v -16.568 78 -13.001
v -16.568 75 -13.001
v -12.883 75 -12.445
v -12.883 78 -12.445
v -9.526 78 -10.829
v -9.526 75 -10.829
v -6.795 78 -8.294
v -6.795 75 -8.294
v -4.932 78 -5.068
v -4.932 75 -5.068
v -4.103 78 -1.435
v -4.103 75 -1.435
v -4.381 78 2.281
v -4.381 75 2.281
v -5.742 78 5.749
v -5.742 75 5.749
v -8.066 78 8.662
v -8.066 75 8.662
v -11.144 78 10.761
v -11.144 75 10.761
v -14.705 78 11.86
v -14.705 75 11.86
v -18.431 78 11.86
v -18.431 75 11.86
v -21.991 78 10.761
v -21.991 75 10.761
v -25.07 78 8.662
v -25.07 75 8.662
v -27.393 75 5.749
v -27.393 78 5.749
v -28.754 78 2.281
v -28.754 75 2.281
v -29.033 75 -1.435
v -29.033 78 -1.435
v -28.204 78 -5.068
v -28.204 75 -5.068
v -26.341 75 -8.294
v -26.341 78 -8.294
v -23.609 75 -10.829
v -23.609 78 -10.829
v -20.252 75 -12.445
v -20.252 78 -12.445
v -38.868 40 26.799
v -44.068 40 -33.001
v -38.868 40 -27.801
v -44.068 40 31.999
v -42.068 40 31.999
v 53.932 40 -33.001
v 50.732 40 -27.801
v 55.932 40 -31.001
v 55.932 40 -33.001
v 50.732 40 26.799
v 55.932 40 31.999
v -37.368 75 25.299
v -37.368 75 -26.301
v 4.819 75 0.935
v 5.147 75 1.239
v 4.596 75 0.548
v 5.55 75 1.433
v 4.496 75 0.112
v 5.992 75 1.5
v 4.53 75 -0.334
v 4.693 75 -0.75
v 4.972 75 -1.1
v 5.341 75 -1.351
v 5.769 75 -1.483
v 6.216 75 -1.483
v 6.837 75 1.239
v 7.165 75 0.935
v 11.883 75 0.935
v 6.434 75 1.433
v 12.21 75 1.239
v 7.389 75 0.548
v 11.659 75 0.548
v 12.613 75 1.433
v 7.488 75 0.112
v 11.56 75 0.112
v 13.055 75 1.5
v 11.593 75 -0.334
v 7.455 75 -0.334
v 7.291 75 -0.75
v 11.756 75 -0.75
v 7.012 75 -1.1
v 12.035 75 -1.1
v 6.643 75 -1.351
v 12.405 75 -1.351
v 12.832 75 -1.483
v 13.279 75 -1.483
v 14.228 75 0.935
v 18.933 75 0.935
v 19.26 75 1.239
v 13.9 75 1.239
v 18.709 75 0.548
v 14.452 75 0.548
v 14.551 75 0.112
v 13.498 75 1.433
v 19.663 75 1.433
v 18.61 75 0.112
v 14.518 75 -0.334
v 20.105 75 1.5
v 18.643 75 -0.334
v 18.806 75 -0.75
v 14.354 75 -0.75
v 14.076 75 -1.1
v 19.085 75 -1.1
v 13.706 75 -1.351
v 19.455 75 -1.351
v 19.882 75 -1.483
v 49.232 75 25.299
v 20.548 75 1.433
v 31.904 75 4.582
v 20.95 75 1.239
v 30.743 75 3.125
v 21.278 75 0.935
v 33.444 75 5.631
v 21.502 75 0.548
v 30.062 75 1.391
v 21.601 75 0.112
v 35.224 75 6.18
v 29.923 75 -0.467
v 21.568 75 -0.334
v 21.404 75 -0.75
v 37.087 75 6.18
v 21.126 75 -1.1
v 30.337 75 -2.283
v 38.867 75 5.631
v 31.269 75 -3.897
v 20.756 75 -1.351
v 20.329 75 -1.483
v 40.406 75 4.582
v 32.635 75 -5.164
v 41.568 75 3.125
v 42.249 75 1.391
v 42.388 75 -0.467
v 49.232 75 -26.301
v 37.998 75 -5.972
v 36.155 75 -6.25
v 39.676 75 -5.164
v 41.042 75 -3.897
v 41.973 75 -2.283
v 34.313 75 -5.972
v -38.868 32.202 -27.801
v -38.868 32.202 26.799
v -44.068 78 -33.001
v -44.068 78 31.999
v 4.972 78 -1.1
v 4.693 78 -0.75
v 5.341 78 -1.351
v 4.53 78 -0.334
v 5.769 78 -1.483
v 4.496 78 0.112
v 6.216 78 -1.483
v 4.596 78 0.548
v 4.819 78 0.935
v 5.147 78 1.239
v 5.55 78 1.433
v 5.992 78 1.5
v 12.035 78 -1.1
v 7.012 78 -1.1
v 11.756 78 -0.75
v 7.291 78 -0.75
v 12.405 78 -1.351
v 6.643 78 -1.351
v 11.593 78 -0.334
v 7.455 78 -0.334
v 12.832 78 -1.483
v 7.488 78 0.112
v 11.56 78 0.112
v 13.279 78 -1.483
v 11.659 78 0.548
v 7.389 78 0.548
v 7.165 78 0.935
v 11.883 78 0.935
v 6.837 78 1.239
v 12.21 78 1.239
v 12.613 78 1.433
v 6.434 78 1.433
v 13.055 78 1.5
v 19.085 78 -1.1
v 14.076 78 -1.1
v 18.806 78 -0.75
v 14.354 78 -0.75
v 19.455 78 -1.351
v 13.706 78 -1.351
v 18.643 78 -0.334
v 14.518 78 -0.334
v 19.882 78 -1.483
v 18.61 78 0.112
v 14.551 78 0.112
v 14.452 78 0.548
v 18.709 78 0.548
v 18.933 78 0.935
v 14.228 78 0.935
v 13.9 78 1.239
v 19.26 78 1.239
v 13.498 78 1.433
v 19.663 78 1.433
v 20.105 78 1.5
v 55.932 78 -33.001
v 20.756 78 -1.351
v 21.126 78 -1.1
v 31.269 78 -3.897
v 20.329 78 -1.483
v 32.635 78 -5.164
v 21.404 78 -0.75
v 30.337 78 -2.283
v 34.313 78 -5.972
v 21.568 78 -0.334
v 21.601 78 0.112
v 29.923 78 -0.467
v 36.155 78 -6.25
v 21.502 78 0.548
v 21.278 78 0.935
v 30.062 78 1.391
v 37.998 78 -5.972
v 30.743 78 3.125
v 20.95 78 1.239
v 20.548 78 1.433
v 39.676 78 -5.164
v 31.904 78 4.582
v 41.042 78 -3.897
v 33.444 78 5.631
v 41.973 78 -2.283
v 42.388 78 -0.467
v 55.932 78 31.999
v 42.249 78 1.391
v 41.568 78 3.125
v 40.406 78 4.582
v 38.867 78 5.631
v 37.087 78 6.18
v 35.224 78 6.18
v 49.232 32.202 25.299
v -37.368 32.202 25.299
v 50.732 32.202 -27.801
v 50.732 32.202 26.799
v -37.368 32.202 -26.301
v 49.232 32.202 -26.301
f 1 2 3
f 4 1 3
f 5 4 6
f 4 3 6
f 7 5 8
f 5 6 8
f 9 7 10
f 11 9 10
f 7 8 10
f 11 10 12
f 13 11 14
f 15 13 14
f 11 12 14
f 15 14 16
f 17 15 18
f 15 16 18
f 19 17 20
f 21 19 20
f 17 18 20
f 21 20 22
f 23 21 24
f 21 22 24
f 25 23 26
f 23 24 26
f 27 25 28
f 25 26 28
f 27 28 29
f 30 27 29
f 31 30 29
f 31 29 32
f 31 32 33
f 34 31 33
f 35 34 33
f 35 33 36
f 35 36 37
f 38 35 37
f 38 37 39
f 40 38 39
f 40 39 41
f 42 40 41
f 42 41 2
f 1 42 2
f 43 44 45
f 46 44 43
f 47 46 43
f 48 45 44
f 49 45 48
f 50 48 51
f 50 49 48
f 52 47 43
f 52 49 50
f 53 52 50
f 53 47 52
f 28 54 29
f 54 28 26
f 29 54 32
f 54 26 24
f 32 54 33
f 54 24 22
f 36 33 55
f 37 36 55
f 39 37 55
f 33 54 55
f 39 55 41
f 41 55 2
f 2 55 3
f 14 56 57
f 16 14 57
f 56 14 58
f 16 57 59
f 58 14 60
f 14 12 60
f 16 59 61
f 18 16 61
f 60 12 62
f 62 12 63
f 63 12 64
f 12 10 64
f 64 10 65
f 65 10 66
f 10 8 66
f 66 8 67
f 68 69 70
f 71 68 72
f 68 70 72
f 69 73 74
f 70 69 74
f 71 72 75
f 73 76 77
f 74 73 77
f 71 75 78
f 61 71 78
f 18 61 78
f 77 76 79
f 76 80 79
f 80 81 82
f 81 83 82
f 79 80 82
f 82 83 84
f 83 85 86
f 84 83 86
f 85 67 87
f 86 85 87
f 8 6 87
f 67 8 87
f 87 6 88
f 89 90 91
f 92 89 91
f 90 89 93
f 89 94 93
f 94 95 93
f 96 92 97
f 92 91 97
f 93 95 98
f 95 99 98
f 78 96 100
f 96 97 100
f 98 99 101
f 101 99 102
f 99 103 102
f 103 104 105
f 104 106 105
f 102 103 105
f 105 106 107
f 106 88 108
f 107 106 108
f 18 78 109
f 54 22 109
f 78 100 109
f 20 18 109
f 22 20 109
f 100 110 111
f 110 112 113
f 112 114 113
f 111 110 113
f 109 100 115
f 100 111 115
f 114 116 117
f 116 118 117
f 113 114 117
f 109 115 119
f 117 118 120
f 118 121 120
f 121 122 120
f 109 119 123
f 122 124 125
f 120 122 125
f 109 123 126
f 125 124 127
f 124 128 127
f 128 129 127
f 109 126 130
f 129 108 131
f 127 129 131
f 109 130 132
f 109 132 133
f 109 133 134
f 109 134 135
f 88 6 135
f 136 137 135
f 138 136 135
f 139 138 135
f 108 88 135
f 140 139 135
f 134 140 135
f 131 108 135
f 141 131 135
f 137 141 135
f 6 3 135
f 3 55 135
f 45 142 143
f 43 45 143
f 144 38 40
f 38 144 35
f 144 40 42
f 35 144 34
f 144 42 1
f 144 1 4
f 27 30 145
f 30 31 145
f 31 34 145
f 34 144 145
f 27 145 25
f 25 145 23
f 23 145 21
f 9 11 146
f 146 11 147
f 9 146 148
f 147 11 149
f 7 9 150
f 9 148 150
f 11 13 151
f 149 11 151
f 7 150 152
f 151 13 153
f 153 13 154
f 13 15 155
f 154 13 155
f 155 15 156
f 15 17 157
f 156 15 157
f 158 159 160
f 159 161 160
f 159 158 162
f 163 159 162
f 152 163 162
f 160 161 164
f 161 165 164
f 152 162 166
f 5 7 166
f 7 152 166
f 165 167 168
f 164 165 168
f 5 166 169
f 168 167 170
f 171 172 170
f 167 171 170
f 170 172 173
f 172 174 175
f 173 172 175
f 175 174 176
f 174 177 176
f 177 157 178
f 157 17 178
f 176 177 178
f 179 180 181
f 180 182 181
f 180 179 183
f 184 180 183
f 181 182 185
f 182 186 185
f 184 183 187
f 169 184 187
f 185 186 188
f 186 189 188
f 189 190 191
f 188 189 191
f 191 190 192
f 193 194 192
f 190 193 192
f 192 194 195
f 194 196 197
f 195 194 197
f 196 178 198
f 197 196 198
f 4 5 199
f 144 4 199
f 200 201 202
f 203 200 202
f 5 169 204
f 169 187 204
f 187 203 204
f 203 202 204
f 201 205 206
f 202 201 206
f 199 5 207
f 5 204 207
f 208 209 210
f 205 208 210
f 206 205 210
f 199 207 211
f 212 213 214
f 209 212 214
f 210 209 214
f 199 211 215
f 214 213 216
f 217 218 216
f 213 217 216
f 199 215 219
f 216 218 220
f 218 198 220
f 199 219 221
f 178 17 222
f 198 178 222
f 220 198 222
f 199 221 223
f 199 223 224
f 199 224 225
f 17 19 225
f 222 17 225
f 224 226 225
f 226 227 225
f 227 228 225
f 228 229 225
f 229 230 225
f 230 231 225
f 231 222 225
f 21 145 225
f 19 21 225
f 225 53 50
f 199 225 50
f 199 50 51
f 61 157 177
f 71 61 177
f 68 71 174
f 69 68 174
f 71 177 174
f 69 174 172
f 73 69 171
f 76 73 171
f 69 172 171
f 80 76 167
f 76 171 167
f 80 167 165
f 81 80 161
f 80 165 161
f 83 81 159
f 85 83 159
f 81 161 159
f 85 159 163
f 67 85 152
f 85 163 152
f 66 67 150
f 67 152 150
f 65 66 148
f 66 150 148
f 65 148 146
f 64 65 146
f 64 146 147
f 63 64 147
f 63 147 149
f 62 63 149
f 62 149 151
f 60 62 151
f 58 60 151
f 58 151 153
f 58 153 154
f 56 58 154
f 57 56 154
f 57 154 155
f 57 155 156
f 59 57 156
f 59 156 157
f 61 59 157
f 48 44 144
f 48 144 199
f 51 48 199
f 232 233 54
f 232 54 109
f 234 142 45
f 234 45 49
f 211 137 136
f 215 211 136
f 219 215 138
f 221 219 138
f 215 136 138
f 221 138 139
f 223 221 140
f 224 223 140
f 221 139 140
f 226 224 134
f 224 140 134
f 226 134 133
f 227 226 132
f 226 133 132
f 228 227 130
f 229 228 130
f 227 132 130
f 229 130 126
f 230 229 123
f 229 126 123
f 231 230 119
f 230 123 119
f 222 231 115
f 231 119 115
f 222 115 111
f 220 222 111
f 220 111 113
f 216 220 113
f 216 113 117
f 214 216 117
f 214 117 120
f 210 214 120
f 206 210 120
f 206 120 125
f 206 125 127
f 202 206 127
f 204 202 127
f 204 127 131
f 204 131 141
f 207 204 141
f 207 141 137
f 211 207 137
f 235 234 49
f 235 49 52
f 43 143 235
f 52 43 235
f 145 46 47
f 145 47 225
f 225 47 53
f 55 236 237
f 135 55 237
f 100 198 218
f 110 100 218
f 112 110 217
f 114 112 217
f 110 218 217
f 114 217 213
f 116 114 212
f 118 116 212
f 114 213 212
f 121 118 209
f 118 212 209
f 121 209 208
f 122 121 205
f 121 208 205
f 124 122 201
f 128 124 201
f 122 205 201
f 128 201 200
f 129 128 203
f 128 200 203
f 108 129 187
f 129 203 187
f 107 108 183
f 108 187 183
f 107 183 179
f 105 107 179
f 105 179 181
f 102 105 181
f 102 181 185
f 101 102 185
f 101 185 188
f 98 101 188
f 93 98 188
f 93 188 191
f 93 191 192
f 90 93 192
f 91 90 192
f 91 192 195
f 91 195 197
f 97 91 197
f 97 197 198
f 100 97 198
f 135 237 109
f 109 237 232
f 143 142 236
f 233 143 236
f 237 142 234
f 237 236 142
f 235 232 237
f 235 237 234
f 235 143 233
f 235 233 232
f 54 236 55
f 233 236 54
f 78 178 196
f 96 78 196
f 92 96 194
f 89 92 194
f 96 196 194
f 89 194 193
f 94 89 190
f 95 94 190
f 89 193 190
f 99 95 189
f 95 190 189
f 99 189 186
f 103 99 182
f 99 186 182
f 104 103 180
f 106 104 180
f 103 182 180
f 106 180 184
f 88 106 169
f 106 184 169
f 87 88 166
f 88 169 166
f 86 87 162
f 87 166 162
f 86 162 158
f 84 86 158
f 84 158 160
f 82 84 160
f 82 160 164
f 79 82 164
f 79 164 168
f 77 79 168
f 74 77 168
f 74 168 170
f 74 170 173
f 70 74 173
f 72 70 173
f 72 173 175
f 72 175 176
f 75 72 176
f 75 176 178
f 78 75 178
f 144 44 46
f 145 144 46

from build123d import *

# Parameters (mm, degrees)
STOCK_PART1_1_START         = 40
STOCK_PART1_1_OUTLINE_W     = 90
STOCK_PART1_1_OUTLINE_H     = 55
STOCK_PART1_1_DEPTH         = 40
STOCK_PART1_1_START_2       = 75
STOCK_PART1_1_2_OUTLINE_W   = 90
STOCK_PART1_1_2_OUTLINE_H   = 55
STOCK_PART1_1_2_OUTLINE_R   = 6.10322586
STOCK_PART1_1_2_OUTLINE_R_2 = 17.5
STOCK_PART1_1_2_DEPTH       = 5
SKETCH1_W                   = 5
SKETCH1_H                   = 8.27683309
SKETCH1_W_2                 = 4.100738493
SKETCH1_H_2                 = 4.176305195
SKETCH1_W_3                 = 4.702811088
SKETCH1_H_3                 = 4.424974218
SKETCH1_W_4                 = 6.384187924
SKETCH1_H_4                 = 4.971555085
BOSS_EXTRUDE2_DEPTH         = 40
SKETCH2_W                   = 90
SKETCH2_H                   = 55
SKETCH2_W_2                 = 87.6
SKETCH2_H_2                 = 52.6
EXTRUDE_THIN1_DEPTH         = 35
SKETCH3_W                   = 89.6
SKETCH3_H                   = 54.6
SKETCH3_W_2                 = 87.6
SKETCH3_H_2                 = 52.6
EXTRUDE_THIN2_DEPTH         = 35
SKETCH4_R                   = 23.5
SKETCH4_R_2                 = 12.5
EXTRUDE_THIN3_DEPTH         = 5
SKETCH5_W                   = 54.6
SKETCH5_H                   = 27.201852287
CUT_EXTRUDE1_DEPTH          = 115
SKETCH6_W                   = 87.6
SKETCH6_H                   = 52.6
SKETCH6_W_2                 = 86.6
SKETCH6_H_2                 = 51.6
EXTRUDE_THIN4_DEPTH         = 43
SKETCH8_W                   = 92.344497842
SKETCH8_H                   = 10.122612515
CUT_EXTRUDE3_DEPTH          = 97.8
SKETCH7_W                   = 89.6
SKETCH7_H                   = 54.6
SKETCH7_W_2                 = 86.6
SKETCH7_H_2                 = 51.6
EXTRUDE_THIN5_DEPTH         = 7.8
SKETCH9_R                   = 6.25
CUT_EXTRUDE4_DEPTH          = 37.8
SKETCH11_W                  = 37.538664257
SKETCH11_H                  = 33.375163033
BOSS_EXTRUDE3_DEPTH         = 5
SKETCH10_R                  = 12.5
CUT_EXTRUDE5_DEPTH          = 5
SKETCH12_W                  = 100
SKETCH12_H                  = 2
CUT_EXTRUDE6_DEPTH          = 135
SKETCH14_R                  = 1.5
CUT_EXTRUDE7_DEPTH          = 135


# Read off the part's stored shape, not the designer's step: Stock-Part1-1
with BuildPart() as part:
    # Stock-Part1-1 outline → Stock-Part1-1 (new body)
    with BuildSketch(Plane(origin=(0, 0, 0), x_dir=(1, 0, 0), z_dir=(0, 1, 0)).offset(STOCK_PART1_1_START)):
        with BuildLine():
            Line((55.93220339, -29.999229584), (55.93220339, 31.000770416))
            ThreePointArc((55.93220339, 31.000770416), (52.517989827, 29.586556854), (53.93220339, 33.000770416))
            Line((53.93220339, 33.000770416), (-42.06779661, 33.000770416))
            ThreePointArc((-42.06779661, 33.000770416), (-40.653583048, 29.586556854), (-44.06779661, 31.000770416))
            Line((-44.06779661, 31.000770416), (-44.06779661, -29.999229584))
            ThreePointArc((-44.06779661, -29.999229584), (-40.653583048, -28.585016022), (-42.06779661, -31.999229584))
            Line((-42.06779661, -31.999229584), (53.93220339, -31.999229584))
            ThreePointArc((53.93220339, -31.999229584), (52.517989827, -28.585016021), (55.93220339, -29.999229584))
        make_face()
        with Locations((5.93220339, 0.500770416)):
            Rectangle(STOCK_PART1_1_OUTLINE_W, STOCK_PART1_1_OUTLINE_H, mode=Mode.SUBTRACT)
    extrude(amount=STOCK_PART1_1_DEPTH)

    # Stock-Part1-1 2 outline → Stock-Part1-1 2 (add)
    with BuildSketch(Plane(origin=(0, 0, 0), x_dir=(1, 0, 0), z_dir=(0, 1, 0)).offset(STOCK_PART1_1_START_2)):
        with Locations((5.93220339, 0.500770416)):
            Rectangle(STOCK_PART1_1_2_OUTLINE_W, STOCK_PART1_1_2_OUTLINE_H)
        with Locations((36.155377847, 0)):
            Circle(STOCK_PART1_1_2_OUTLINE_R, mode=Mode.SUBTRACT)
        with Locations((-11.56779661, 0.500770416)):
            Circle(STOCK_PART1_1_2_OUTLINE_R_2, mode=Mode.SUBTRACT)
    extrude(amount=STOCK_PART1_1_2_DEPTH)

    # Sketch1 → Boss-Extrude2 (add)
    with BuildSketch(Plane.XZ.offset(-40)):
        with Locations((-41.56779661, -28.862353871)):
            Rectangle(SKETCH1_W, SKETCH1_H)
        with Locations((53.881834144, -30.912617819)):
            Rectangle(SKETCH1_W_2, SKETCH1_H_2)
        with Locations((53.580797846, 29.786742475)):
            Rectangle(SKETCH1_W_3, SKETCH1_H_3)
        with Locations((-40.875702648, 29.513452042)):
            Rectangle(SKETCH1_W_4, SKETCH1_H_4)
    extrude(amount=-BOSS_EXTRUDE2_DEPTH)

    # Sketch2 → Extrude-Thin1 (add)
    with BuildSketch(Plane.XZ.offset(-75)):
        with Locations((5.93220339, -0.500770416)):
            Rectangle(SKETCH2_W, SKETCH2_H)
        with Locations((5.93220339, -0.500770416)):
            Rectangle(SKETCH2_W_2, SKETCH2_H_2, mode=Mode.SUBTRACT)
    extrude(amount=EXTRUDE_THIN1_DEPTH)

    # Sketch3 → Extrude-Thin2 (add)
    with BuildSketch(Plane.XZ.offset(-40)):
        with Locations((5.93220339, -0.500770416)):
            Rectangle(SKETCH3_W, SKETCH3_H)
        with Locations((5.93220339, -0.500770416)):
            Rectangle(SKETCH3_W_2, SKETCH3_H_2, mode=Mode.SUBTRACT)
    extrude(amount=EXTRUDE_THIN2_DEPTH)

    # Sketch4 → Extrude-Thin3 (add)
    with BuildSketch(Plane(origin=(0, 80, 0), x_dir=(1, 0, 0), z_dir=(0, 1, 0))):
        with Locations((-11.56779661, 0.500770416)):
            Circle(SKETCH4_R)
        with Locations((-11.56779661, 0.500770416)):
            Circle(SKETCH4_R_2, mode=Mode.SUBTRACT)
    extrude(amount=-EXTRUDE_THIN3_DEPTH)

    # Sketch5 → Cut-Extrude1 (cut)
    with BuildSketch(Plane.ZY.offset(38.86779661)):
        with Locations((-0.500770416, 18.600926144)):
            Rectangle(SKETCH5_W, SKETCH5_H)
    extrude(amount=-CUT_EXTRUDE1_DEPTH, mode=Mode.SUBTRACT)

    # Sketch6 → Extrude-Thin4 (add)
    with BuildSketch(Plane.XZ.offset(-75)):
        with Locations((5.93220339, -0.500770416)):
            Rectangle(SKETCH6_W, SKETCH6_H)
        with Locations((5.93220339, -0.500770416)):
            Rectangle(SKETCH6_W_2, SKETCH6_H_2, mode=Mode.SUBTRACT)
    extrude(amount=EXTRUDE_THIN4_DEPTH)

    # Sketch8 → Cut-Extrude3 (cut)
    with BuildSketch(Plane.XY.offset(26.799229584)):
        with Locations((7.304452311, 34.938693742)):
            Rectangle(SKETCH8_W, SKETCH8_H)
    extrude(amount=-CUT_EXTRUDE3_DEPTH, mode=Mode.SUBTRACT)

    # Sketch7 → Extrude-Thin5 (add)
    with BuildSketch(Plane.XZ.offset(-32.201852287)):
        with Locations((5.93220339, -0.500770416)):
            Rectangle(SKETCH7_W, SKETCH7_H)
        with Locations((5.93220339, -0.500770416)):
            Rectangle(SKETCH7_W_2, SKETCH7_H_2, mode=Mode.SUBTRACT)
    extrude(amount=-EXTRUDE_THIN5_DEPTH)

    # Sketch9 → Cut-Extrude4 (cut)
    with BuildSketch(Plane.XZ.offset(-75)):
        with Locations(Location((36.155377847, 0, 0), (0, 0, 270))):
            Circle(SKETCH9_R)
    extrude(amount=-CUT_EXTRUDE4_DEPTH, mode=Mode.SUBTRACT)

    # Sketch11 → Boss-Extrude3 (add)
    with BuildSketch(Plane(origin=(0, 80, 0), x_dir=(1, 0, 0), z_dir=(0, 1, 0))):
        with Locations((-12.97143523, -0.741564626)):
            Rectangle(SKETCH11_W, SKETCH11_H)
    extrude(amount=-BOSS_EXTRUDE3_DEPTH)

    # Sketch10 → Cut-Extrude5 (cut)
    with BuildSketch(Plane.XZ.offset(-75)):
        with Locations(Location((-16.56779661, -0.500770416, 0), (0, 0, 270))):
            Circle(SKETCH10_R)
    extrude(amount=-CUT_EXTRUDE5_DEPTH, mode=Mode.SUBTRACT)

    # Sketch12 → Cut-Extrude6 (cut)
    with BuildSketch(Plane.XY.offset(31.999229584)):
        with Locations((5.93220339, 79)):
            Rectangle(SKETCH12_W, SKETCH12_H)
    extrude(amount=-CUT_EXTRUDE6_DEPTH, mode=Mode.SUBTRACT)

    # Sketch14 → Cut-Extrude7 (cut)
    with BuildSketch(Plane(origin=(0, 78, 0), x_dir=(1, 0, 0), z_dir=(0, 1, 0))):
        with Locations(Location((13.055377847, 0, 0), (0, 0, 270))):
            Circle(SKETCH14_R)
        with Locations(Location((20.105377847, 0, 0), (0, 0, 270))):
            Circle(SKETCH14_R)
        with Locations(Location((5.992200992, 0, 0), (0, 0, 270))):
            Circle(SKETCH14_R)
    extrude(amount=-CUT_EXTRUDE7_DEPTH, mode=Mode.SUBTRACT)


solid = part.part
